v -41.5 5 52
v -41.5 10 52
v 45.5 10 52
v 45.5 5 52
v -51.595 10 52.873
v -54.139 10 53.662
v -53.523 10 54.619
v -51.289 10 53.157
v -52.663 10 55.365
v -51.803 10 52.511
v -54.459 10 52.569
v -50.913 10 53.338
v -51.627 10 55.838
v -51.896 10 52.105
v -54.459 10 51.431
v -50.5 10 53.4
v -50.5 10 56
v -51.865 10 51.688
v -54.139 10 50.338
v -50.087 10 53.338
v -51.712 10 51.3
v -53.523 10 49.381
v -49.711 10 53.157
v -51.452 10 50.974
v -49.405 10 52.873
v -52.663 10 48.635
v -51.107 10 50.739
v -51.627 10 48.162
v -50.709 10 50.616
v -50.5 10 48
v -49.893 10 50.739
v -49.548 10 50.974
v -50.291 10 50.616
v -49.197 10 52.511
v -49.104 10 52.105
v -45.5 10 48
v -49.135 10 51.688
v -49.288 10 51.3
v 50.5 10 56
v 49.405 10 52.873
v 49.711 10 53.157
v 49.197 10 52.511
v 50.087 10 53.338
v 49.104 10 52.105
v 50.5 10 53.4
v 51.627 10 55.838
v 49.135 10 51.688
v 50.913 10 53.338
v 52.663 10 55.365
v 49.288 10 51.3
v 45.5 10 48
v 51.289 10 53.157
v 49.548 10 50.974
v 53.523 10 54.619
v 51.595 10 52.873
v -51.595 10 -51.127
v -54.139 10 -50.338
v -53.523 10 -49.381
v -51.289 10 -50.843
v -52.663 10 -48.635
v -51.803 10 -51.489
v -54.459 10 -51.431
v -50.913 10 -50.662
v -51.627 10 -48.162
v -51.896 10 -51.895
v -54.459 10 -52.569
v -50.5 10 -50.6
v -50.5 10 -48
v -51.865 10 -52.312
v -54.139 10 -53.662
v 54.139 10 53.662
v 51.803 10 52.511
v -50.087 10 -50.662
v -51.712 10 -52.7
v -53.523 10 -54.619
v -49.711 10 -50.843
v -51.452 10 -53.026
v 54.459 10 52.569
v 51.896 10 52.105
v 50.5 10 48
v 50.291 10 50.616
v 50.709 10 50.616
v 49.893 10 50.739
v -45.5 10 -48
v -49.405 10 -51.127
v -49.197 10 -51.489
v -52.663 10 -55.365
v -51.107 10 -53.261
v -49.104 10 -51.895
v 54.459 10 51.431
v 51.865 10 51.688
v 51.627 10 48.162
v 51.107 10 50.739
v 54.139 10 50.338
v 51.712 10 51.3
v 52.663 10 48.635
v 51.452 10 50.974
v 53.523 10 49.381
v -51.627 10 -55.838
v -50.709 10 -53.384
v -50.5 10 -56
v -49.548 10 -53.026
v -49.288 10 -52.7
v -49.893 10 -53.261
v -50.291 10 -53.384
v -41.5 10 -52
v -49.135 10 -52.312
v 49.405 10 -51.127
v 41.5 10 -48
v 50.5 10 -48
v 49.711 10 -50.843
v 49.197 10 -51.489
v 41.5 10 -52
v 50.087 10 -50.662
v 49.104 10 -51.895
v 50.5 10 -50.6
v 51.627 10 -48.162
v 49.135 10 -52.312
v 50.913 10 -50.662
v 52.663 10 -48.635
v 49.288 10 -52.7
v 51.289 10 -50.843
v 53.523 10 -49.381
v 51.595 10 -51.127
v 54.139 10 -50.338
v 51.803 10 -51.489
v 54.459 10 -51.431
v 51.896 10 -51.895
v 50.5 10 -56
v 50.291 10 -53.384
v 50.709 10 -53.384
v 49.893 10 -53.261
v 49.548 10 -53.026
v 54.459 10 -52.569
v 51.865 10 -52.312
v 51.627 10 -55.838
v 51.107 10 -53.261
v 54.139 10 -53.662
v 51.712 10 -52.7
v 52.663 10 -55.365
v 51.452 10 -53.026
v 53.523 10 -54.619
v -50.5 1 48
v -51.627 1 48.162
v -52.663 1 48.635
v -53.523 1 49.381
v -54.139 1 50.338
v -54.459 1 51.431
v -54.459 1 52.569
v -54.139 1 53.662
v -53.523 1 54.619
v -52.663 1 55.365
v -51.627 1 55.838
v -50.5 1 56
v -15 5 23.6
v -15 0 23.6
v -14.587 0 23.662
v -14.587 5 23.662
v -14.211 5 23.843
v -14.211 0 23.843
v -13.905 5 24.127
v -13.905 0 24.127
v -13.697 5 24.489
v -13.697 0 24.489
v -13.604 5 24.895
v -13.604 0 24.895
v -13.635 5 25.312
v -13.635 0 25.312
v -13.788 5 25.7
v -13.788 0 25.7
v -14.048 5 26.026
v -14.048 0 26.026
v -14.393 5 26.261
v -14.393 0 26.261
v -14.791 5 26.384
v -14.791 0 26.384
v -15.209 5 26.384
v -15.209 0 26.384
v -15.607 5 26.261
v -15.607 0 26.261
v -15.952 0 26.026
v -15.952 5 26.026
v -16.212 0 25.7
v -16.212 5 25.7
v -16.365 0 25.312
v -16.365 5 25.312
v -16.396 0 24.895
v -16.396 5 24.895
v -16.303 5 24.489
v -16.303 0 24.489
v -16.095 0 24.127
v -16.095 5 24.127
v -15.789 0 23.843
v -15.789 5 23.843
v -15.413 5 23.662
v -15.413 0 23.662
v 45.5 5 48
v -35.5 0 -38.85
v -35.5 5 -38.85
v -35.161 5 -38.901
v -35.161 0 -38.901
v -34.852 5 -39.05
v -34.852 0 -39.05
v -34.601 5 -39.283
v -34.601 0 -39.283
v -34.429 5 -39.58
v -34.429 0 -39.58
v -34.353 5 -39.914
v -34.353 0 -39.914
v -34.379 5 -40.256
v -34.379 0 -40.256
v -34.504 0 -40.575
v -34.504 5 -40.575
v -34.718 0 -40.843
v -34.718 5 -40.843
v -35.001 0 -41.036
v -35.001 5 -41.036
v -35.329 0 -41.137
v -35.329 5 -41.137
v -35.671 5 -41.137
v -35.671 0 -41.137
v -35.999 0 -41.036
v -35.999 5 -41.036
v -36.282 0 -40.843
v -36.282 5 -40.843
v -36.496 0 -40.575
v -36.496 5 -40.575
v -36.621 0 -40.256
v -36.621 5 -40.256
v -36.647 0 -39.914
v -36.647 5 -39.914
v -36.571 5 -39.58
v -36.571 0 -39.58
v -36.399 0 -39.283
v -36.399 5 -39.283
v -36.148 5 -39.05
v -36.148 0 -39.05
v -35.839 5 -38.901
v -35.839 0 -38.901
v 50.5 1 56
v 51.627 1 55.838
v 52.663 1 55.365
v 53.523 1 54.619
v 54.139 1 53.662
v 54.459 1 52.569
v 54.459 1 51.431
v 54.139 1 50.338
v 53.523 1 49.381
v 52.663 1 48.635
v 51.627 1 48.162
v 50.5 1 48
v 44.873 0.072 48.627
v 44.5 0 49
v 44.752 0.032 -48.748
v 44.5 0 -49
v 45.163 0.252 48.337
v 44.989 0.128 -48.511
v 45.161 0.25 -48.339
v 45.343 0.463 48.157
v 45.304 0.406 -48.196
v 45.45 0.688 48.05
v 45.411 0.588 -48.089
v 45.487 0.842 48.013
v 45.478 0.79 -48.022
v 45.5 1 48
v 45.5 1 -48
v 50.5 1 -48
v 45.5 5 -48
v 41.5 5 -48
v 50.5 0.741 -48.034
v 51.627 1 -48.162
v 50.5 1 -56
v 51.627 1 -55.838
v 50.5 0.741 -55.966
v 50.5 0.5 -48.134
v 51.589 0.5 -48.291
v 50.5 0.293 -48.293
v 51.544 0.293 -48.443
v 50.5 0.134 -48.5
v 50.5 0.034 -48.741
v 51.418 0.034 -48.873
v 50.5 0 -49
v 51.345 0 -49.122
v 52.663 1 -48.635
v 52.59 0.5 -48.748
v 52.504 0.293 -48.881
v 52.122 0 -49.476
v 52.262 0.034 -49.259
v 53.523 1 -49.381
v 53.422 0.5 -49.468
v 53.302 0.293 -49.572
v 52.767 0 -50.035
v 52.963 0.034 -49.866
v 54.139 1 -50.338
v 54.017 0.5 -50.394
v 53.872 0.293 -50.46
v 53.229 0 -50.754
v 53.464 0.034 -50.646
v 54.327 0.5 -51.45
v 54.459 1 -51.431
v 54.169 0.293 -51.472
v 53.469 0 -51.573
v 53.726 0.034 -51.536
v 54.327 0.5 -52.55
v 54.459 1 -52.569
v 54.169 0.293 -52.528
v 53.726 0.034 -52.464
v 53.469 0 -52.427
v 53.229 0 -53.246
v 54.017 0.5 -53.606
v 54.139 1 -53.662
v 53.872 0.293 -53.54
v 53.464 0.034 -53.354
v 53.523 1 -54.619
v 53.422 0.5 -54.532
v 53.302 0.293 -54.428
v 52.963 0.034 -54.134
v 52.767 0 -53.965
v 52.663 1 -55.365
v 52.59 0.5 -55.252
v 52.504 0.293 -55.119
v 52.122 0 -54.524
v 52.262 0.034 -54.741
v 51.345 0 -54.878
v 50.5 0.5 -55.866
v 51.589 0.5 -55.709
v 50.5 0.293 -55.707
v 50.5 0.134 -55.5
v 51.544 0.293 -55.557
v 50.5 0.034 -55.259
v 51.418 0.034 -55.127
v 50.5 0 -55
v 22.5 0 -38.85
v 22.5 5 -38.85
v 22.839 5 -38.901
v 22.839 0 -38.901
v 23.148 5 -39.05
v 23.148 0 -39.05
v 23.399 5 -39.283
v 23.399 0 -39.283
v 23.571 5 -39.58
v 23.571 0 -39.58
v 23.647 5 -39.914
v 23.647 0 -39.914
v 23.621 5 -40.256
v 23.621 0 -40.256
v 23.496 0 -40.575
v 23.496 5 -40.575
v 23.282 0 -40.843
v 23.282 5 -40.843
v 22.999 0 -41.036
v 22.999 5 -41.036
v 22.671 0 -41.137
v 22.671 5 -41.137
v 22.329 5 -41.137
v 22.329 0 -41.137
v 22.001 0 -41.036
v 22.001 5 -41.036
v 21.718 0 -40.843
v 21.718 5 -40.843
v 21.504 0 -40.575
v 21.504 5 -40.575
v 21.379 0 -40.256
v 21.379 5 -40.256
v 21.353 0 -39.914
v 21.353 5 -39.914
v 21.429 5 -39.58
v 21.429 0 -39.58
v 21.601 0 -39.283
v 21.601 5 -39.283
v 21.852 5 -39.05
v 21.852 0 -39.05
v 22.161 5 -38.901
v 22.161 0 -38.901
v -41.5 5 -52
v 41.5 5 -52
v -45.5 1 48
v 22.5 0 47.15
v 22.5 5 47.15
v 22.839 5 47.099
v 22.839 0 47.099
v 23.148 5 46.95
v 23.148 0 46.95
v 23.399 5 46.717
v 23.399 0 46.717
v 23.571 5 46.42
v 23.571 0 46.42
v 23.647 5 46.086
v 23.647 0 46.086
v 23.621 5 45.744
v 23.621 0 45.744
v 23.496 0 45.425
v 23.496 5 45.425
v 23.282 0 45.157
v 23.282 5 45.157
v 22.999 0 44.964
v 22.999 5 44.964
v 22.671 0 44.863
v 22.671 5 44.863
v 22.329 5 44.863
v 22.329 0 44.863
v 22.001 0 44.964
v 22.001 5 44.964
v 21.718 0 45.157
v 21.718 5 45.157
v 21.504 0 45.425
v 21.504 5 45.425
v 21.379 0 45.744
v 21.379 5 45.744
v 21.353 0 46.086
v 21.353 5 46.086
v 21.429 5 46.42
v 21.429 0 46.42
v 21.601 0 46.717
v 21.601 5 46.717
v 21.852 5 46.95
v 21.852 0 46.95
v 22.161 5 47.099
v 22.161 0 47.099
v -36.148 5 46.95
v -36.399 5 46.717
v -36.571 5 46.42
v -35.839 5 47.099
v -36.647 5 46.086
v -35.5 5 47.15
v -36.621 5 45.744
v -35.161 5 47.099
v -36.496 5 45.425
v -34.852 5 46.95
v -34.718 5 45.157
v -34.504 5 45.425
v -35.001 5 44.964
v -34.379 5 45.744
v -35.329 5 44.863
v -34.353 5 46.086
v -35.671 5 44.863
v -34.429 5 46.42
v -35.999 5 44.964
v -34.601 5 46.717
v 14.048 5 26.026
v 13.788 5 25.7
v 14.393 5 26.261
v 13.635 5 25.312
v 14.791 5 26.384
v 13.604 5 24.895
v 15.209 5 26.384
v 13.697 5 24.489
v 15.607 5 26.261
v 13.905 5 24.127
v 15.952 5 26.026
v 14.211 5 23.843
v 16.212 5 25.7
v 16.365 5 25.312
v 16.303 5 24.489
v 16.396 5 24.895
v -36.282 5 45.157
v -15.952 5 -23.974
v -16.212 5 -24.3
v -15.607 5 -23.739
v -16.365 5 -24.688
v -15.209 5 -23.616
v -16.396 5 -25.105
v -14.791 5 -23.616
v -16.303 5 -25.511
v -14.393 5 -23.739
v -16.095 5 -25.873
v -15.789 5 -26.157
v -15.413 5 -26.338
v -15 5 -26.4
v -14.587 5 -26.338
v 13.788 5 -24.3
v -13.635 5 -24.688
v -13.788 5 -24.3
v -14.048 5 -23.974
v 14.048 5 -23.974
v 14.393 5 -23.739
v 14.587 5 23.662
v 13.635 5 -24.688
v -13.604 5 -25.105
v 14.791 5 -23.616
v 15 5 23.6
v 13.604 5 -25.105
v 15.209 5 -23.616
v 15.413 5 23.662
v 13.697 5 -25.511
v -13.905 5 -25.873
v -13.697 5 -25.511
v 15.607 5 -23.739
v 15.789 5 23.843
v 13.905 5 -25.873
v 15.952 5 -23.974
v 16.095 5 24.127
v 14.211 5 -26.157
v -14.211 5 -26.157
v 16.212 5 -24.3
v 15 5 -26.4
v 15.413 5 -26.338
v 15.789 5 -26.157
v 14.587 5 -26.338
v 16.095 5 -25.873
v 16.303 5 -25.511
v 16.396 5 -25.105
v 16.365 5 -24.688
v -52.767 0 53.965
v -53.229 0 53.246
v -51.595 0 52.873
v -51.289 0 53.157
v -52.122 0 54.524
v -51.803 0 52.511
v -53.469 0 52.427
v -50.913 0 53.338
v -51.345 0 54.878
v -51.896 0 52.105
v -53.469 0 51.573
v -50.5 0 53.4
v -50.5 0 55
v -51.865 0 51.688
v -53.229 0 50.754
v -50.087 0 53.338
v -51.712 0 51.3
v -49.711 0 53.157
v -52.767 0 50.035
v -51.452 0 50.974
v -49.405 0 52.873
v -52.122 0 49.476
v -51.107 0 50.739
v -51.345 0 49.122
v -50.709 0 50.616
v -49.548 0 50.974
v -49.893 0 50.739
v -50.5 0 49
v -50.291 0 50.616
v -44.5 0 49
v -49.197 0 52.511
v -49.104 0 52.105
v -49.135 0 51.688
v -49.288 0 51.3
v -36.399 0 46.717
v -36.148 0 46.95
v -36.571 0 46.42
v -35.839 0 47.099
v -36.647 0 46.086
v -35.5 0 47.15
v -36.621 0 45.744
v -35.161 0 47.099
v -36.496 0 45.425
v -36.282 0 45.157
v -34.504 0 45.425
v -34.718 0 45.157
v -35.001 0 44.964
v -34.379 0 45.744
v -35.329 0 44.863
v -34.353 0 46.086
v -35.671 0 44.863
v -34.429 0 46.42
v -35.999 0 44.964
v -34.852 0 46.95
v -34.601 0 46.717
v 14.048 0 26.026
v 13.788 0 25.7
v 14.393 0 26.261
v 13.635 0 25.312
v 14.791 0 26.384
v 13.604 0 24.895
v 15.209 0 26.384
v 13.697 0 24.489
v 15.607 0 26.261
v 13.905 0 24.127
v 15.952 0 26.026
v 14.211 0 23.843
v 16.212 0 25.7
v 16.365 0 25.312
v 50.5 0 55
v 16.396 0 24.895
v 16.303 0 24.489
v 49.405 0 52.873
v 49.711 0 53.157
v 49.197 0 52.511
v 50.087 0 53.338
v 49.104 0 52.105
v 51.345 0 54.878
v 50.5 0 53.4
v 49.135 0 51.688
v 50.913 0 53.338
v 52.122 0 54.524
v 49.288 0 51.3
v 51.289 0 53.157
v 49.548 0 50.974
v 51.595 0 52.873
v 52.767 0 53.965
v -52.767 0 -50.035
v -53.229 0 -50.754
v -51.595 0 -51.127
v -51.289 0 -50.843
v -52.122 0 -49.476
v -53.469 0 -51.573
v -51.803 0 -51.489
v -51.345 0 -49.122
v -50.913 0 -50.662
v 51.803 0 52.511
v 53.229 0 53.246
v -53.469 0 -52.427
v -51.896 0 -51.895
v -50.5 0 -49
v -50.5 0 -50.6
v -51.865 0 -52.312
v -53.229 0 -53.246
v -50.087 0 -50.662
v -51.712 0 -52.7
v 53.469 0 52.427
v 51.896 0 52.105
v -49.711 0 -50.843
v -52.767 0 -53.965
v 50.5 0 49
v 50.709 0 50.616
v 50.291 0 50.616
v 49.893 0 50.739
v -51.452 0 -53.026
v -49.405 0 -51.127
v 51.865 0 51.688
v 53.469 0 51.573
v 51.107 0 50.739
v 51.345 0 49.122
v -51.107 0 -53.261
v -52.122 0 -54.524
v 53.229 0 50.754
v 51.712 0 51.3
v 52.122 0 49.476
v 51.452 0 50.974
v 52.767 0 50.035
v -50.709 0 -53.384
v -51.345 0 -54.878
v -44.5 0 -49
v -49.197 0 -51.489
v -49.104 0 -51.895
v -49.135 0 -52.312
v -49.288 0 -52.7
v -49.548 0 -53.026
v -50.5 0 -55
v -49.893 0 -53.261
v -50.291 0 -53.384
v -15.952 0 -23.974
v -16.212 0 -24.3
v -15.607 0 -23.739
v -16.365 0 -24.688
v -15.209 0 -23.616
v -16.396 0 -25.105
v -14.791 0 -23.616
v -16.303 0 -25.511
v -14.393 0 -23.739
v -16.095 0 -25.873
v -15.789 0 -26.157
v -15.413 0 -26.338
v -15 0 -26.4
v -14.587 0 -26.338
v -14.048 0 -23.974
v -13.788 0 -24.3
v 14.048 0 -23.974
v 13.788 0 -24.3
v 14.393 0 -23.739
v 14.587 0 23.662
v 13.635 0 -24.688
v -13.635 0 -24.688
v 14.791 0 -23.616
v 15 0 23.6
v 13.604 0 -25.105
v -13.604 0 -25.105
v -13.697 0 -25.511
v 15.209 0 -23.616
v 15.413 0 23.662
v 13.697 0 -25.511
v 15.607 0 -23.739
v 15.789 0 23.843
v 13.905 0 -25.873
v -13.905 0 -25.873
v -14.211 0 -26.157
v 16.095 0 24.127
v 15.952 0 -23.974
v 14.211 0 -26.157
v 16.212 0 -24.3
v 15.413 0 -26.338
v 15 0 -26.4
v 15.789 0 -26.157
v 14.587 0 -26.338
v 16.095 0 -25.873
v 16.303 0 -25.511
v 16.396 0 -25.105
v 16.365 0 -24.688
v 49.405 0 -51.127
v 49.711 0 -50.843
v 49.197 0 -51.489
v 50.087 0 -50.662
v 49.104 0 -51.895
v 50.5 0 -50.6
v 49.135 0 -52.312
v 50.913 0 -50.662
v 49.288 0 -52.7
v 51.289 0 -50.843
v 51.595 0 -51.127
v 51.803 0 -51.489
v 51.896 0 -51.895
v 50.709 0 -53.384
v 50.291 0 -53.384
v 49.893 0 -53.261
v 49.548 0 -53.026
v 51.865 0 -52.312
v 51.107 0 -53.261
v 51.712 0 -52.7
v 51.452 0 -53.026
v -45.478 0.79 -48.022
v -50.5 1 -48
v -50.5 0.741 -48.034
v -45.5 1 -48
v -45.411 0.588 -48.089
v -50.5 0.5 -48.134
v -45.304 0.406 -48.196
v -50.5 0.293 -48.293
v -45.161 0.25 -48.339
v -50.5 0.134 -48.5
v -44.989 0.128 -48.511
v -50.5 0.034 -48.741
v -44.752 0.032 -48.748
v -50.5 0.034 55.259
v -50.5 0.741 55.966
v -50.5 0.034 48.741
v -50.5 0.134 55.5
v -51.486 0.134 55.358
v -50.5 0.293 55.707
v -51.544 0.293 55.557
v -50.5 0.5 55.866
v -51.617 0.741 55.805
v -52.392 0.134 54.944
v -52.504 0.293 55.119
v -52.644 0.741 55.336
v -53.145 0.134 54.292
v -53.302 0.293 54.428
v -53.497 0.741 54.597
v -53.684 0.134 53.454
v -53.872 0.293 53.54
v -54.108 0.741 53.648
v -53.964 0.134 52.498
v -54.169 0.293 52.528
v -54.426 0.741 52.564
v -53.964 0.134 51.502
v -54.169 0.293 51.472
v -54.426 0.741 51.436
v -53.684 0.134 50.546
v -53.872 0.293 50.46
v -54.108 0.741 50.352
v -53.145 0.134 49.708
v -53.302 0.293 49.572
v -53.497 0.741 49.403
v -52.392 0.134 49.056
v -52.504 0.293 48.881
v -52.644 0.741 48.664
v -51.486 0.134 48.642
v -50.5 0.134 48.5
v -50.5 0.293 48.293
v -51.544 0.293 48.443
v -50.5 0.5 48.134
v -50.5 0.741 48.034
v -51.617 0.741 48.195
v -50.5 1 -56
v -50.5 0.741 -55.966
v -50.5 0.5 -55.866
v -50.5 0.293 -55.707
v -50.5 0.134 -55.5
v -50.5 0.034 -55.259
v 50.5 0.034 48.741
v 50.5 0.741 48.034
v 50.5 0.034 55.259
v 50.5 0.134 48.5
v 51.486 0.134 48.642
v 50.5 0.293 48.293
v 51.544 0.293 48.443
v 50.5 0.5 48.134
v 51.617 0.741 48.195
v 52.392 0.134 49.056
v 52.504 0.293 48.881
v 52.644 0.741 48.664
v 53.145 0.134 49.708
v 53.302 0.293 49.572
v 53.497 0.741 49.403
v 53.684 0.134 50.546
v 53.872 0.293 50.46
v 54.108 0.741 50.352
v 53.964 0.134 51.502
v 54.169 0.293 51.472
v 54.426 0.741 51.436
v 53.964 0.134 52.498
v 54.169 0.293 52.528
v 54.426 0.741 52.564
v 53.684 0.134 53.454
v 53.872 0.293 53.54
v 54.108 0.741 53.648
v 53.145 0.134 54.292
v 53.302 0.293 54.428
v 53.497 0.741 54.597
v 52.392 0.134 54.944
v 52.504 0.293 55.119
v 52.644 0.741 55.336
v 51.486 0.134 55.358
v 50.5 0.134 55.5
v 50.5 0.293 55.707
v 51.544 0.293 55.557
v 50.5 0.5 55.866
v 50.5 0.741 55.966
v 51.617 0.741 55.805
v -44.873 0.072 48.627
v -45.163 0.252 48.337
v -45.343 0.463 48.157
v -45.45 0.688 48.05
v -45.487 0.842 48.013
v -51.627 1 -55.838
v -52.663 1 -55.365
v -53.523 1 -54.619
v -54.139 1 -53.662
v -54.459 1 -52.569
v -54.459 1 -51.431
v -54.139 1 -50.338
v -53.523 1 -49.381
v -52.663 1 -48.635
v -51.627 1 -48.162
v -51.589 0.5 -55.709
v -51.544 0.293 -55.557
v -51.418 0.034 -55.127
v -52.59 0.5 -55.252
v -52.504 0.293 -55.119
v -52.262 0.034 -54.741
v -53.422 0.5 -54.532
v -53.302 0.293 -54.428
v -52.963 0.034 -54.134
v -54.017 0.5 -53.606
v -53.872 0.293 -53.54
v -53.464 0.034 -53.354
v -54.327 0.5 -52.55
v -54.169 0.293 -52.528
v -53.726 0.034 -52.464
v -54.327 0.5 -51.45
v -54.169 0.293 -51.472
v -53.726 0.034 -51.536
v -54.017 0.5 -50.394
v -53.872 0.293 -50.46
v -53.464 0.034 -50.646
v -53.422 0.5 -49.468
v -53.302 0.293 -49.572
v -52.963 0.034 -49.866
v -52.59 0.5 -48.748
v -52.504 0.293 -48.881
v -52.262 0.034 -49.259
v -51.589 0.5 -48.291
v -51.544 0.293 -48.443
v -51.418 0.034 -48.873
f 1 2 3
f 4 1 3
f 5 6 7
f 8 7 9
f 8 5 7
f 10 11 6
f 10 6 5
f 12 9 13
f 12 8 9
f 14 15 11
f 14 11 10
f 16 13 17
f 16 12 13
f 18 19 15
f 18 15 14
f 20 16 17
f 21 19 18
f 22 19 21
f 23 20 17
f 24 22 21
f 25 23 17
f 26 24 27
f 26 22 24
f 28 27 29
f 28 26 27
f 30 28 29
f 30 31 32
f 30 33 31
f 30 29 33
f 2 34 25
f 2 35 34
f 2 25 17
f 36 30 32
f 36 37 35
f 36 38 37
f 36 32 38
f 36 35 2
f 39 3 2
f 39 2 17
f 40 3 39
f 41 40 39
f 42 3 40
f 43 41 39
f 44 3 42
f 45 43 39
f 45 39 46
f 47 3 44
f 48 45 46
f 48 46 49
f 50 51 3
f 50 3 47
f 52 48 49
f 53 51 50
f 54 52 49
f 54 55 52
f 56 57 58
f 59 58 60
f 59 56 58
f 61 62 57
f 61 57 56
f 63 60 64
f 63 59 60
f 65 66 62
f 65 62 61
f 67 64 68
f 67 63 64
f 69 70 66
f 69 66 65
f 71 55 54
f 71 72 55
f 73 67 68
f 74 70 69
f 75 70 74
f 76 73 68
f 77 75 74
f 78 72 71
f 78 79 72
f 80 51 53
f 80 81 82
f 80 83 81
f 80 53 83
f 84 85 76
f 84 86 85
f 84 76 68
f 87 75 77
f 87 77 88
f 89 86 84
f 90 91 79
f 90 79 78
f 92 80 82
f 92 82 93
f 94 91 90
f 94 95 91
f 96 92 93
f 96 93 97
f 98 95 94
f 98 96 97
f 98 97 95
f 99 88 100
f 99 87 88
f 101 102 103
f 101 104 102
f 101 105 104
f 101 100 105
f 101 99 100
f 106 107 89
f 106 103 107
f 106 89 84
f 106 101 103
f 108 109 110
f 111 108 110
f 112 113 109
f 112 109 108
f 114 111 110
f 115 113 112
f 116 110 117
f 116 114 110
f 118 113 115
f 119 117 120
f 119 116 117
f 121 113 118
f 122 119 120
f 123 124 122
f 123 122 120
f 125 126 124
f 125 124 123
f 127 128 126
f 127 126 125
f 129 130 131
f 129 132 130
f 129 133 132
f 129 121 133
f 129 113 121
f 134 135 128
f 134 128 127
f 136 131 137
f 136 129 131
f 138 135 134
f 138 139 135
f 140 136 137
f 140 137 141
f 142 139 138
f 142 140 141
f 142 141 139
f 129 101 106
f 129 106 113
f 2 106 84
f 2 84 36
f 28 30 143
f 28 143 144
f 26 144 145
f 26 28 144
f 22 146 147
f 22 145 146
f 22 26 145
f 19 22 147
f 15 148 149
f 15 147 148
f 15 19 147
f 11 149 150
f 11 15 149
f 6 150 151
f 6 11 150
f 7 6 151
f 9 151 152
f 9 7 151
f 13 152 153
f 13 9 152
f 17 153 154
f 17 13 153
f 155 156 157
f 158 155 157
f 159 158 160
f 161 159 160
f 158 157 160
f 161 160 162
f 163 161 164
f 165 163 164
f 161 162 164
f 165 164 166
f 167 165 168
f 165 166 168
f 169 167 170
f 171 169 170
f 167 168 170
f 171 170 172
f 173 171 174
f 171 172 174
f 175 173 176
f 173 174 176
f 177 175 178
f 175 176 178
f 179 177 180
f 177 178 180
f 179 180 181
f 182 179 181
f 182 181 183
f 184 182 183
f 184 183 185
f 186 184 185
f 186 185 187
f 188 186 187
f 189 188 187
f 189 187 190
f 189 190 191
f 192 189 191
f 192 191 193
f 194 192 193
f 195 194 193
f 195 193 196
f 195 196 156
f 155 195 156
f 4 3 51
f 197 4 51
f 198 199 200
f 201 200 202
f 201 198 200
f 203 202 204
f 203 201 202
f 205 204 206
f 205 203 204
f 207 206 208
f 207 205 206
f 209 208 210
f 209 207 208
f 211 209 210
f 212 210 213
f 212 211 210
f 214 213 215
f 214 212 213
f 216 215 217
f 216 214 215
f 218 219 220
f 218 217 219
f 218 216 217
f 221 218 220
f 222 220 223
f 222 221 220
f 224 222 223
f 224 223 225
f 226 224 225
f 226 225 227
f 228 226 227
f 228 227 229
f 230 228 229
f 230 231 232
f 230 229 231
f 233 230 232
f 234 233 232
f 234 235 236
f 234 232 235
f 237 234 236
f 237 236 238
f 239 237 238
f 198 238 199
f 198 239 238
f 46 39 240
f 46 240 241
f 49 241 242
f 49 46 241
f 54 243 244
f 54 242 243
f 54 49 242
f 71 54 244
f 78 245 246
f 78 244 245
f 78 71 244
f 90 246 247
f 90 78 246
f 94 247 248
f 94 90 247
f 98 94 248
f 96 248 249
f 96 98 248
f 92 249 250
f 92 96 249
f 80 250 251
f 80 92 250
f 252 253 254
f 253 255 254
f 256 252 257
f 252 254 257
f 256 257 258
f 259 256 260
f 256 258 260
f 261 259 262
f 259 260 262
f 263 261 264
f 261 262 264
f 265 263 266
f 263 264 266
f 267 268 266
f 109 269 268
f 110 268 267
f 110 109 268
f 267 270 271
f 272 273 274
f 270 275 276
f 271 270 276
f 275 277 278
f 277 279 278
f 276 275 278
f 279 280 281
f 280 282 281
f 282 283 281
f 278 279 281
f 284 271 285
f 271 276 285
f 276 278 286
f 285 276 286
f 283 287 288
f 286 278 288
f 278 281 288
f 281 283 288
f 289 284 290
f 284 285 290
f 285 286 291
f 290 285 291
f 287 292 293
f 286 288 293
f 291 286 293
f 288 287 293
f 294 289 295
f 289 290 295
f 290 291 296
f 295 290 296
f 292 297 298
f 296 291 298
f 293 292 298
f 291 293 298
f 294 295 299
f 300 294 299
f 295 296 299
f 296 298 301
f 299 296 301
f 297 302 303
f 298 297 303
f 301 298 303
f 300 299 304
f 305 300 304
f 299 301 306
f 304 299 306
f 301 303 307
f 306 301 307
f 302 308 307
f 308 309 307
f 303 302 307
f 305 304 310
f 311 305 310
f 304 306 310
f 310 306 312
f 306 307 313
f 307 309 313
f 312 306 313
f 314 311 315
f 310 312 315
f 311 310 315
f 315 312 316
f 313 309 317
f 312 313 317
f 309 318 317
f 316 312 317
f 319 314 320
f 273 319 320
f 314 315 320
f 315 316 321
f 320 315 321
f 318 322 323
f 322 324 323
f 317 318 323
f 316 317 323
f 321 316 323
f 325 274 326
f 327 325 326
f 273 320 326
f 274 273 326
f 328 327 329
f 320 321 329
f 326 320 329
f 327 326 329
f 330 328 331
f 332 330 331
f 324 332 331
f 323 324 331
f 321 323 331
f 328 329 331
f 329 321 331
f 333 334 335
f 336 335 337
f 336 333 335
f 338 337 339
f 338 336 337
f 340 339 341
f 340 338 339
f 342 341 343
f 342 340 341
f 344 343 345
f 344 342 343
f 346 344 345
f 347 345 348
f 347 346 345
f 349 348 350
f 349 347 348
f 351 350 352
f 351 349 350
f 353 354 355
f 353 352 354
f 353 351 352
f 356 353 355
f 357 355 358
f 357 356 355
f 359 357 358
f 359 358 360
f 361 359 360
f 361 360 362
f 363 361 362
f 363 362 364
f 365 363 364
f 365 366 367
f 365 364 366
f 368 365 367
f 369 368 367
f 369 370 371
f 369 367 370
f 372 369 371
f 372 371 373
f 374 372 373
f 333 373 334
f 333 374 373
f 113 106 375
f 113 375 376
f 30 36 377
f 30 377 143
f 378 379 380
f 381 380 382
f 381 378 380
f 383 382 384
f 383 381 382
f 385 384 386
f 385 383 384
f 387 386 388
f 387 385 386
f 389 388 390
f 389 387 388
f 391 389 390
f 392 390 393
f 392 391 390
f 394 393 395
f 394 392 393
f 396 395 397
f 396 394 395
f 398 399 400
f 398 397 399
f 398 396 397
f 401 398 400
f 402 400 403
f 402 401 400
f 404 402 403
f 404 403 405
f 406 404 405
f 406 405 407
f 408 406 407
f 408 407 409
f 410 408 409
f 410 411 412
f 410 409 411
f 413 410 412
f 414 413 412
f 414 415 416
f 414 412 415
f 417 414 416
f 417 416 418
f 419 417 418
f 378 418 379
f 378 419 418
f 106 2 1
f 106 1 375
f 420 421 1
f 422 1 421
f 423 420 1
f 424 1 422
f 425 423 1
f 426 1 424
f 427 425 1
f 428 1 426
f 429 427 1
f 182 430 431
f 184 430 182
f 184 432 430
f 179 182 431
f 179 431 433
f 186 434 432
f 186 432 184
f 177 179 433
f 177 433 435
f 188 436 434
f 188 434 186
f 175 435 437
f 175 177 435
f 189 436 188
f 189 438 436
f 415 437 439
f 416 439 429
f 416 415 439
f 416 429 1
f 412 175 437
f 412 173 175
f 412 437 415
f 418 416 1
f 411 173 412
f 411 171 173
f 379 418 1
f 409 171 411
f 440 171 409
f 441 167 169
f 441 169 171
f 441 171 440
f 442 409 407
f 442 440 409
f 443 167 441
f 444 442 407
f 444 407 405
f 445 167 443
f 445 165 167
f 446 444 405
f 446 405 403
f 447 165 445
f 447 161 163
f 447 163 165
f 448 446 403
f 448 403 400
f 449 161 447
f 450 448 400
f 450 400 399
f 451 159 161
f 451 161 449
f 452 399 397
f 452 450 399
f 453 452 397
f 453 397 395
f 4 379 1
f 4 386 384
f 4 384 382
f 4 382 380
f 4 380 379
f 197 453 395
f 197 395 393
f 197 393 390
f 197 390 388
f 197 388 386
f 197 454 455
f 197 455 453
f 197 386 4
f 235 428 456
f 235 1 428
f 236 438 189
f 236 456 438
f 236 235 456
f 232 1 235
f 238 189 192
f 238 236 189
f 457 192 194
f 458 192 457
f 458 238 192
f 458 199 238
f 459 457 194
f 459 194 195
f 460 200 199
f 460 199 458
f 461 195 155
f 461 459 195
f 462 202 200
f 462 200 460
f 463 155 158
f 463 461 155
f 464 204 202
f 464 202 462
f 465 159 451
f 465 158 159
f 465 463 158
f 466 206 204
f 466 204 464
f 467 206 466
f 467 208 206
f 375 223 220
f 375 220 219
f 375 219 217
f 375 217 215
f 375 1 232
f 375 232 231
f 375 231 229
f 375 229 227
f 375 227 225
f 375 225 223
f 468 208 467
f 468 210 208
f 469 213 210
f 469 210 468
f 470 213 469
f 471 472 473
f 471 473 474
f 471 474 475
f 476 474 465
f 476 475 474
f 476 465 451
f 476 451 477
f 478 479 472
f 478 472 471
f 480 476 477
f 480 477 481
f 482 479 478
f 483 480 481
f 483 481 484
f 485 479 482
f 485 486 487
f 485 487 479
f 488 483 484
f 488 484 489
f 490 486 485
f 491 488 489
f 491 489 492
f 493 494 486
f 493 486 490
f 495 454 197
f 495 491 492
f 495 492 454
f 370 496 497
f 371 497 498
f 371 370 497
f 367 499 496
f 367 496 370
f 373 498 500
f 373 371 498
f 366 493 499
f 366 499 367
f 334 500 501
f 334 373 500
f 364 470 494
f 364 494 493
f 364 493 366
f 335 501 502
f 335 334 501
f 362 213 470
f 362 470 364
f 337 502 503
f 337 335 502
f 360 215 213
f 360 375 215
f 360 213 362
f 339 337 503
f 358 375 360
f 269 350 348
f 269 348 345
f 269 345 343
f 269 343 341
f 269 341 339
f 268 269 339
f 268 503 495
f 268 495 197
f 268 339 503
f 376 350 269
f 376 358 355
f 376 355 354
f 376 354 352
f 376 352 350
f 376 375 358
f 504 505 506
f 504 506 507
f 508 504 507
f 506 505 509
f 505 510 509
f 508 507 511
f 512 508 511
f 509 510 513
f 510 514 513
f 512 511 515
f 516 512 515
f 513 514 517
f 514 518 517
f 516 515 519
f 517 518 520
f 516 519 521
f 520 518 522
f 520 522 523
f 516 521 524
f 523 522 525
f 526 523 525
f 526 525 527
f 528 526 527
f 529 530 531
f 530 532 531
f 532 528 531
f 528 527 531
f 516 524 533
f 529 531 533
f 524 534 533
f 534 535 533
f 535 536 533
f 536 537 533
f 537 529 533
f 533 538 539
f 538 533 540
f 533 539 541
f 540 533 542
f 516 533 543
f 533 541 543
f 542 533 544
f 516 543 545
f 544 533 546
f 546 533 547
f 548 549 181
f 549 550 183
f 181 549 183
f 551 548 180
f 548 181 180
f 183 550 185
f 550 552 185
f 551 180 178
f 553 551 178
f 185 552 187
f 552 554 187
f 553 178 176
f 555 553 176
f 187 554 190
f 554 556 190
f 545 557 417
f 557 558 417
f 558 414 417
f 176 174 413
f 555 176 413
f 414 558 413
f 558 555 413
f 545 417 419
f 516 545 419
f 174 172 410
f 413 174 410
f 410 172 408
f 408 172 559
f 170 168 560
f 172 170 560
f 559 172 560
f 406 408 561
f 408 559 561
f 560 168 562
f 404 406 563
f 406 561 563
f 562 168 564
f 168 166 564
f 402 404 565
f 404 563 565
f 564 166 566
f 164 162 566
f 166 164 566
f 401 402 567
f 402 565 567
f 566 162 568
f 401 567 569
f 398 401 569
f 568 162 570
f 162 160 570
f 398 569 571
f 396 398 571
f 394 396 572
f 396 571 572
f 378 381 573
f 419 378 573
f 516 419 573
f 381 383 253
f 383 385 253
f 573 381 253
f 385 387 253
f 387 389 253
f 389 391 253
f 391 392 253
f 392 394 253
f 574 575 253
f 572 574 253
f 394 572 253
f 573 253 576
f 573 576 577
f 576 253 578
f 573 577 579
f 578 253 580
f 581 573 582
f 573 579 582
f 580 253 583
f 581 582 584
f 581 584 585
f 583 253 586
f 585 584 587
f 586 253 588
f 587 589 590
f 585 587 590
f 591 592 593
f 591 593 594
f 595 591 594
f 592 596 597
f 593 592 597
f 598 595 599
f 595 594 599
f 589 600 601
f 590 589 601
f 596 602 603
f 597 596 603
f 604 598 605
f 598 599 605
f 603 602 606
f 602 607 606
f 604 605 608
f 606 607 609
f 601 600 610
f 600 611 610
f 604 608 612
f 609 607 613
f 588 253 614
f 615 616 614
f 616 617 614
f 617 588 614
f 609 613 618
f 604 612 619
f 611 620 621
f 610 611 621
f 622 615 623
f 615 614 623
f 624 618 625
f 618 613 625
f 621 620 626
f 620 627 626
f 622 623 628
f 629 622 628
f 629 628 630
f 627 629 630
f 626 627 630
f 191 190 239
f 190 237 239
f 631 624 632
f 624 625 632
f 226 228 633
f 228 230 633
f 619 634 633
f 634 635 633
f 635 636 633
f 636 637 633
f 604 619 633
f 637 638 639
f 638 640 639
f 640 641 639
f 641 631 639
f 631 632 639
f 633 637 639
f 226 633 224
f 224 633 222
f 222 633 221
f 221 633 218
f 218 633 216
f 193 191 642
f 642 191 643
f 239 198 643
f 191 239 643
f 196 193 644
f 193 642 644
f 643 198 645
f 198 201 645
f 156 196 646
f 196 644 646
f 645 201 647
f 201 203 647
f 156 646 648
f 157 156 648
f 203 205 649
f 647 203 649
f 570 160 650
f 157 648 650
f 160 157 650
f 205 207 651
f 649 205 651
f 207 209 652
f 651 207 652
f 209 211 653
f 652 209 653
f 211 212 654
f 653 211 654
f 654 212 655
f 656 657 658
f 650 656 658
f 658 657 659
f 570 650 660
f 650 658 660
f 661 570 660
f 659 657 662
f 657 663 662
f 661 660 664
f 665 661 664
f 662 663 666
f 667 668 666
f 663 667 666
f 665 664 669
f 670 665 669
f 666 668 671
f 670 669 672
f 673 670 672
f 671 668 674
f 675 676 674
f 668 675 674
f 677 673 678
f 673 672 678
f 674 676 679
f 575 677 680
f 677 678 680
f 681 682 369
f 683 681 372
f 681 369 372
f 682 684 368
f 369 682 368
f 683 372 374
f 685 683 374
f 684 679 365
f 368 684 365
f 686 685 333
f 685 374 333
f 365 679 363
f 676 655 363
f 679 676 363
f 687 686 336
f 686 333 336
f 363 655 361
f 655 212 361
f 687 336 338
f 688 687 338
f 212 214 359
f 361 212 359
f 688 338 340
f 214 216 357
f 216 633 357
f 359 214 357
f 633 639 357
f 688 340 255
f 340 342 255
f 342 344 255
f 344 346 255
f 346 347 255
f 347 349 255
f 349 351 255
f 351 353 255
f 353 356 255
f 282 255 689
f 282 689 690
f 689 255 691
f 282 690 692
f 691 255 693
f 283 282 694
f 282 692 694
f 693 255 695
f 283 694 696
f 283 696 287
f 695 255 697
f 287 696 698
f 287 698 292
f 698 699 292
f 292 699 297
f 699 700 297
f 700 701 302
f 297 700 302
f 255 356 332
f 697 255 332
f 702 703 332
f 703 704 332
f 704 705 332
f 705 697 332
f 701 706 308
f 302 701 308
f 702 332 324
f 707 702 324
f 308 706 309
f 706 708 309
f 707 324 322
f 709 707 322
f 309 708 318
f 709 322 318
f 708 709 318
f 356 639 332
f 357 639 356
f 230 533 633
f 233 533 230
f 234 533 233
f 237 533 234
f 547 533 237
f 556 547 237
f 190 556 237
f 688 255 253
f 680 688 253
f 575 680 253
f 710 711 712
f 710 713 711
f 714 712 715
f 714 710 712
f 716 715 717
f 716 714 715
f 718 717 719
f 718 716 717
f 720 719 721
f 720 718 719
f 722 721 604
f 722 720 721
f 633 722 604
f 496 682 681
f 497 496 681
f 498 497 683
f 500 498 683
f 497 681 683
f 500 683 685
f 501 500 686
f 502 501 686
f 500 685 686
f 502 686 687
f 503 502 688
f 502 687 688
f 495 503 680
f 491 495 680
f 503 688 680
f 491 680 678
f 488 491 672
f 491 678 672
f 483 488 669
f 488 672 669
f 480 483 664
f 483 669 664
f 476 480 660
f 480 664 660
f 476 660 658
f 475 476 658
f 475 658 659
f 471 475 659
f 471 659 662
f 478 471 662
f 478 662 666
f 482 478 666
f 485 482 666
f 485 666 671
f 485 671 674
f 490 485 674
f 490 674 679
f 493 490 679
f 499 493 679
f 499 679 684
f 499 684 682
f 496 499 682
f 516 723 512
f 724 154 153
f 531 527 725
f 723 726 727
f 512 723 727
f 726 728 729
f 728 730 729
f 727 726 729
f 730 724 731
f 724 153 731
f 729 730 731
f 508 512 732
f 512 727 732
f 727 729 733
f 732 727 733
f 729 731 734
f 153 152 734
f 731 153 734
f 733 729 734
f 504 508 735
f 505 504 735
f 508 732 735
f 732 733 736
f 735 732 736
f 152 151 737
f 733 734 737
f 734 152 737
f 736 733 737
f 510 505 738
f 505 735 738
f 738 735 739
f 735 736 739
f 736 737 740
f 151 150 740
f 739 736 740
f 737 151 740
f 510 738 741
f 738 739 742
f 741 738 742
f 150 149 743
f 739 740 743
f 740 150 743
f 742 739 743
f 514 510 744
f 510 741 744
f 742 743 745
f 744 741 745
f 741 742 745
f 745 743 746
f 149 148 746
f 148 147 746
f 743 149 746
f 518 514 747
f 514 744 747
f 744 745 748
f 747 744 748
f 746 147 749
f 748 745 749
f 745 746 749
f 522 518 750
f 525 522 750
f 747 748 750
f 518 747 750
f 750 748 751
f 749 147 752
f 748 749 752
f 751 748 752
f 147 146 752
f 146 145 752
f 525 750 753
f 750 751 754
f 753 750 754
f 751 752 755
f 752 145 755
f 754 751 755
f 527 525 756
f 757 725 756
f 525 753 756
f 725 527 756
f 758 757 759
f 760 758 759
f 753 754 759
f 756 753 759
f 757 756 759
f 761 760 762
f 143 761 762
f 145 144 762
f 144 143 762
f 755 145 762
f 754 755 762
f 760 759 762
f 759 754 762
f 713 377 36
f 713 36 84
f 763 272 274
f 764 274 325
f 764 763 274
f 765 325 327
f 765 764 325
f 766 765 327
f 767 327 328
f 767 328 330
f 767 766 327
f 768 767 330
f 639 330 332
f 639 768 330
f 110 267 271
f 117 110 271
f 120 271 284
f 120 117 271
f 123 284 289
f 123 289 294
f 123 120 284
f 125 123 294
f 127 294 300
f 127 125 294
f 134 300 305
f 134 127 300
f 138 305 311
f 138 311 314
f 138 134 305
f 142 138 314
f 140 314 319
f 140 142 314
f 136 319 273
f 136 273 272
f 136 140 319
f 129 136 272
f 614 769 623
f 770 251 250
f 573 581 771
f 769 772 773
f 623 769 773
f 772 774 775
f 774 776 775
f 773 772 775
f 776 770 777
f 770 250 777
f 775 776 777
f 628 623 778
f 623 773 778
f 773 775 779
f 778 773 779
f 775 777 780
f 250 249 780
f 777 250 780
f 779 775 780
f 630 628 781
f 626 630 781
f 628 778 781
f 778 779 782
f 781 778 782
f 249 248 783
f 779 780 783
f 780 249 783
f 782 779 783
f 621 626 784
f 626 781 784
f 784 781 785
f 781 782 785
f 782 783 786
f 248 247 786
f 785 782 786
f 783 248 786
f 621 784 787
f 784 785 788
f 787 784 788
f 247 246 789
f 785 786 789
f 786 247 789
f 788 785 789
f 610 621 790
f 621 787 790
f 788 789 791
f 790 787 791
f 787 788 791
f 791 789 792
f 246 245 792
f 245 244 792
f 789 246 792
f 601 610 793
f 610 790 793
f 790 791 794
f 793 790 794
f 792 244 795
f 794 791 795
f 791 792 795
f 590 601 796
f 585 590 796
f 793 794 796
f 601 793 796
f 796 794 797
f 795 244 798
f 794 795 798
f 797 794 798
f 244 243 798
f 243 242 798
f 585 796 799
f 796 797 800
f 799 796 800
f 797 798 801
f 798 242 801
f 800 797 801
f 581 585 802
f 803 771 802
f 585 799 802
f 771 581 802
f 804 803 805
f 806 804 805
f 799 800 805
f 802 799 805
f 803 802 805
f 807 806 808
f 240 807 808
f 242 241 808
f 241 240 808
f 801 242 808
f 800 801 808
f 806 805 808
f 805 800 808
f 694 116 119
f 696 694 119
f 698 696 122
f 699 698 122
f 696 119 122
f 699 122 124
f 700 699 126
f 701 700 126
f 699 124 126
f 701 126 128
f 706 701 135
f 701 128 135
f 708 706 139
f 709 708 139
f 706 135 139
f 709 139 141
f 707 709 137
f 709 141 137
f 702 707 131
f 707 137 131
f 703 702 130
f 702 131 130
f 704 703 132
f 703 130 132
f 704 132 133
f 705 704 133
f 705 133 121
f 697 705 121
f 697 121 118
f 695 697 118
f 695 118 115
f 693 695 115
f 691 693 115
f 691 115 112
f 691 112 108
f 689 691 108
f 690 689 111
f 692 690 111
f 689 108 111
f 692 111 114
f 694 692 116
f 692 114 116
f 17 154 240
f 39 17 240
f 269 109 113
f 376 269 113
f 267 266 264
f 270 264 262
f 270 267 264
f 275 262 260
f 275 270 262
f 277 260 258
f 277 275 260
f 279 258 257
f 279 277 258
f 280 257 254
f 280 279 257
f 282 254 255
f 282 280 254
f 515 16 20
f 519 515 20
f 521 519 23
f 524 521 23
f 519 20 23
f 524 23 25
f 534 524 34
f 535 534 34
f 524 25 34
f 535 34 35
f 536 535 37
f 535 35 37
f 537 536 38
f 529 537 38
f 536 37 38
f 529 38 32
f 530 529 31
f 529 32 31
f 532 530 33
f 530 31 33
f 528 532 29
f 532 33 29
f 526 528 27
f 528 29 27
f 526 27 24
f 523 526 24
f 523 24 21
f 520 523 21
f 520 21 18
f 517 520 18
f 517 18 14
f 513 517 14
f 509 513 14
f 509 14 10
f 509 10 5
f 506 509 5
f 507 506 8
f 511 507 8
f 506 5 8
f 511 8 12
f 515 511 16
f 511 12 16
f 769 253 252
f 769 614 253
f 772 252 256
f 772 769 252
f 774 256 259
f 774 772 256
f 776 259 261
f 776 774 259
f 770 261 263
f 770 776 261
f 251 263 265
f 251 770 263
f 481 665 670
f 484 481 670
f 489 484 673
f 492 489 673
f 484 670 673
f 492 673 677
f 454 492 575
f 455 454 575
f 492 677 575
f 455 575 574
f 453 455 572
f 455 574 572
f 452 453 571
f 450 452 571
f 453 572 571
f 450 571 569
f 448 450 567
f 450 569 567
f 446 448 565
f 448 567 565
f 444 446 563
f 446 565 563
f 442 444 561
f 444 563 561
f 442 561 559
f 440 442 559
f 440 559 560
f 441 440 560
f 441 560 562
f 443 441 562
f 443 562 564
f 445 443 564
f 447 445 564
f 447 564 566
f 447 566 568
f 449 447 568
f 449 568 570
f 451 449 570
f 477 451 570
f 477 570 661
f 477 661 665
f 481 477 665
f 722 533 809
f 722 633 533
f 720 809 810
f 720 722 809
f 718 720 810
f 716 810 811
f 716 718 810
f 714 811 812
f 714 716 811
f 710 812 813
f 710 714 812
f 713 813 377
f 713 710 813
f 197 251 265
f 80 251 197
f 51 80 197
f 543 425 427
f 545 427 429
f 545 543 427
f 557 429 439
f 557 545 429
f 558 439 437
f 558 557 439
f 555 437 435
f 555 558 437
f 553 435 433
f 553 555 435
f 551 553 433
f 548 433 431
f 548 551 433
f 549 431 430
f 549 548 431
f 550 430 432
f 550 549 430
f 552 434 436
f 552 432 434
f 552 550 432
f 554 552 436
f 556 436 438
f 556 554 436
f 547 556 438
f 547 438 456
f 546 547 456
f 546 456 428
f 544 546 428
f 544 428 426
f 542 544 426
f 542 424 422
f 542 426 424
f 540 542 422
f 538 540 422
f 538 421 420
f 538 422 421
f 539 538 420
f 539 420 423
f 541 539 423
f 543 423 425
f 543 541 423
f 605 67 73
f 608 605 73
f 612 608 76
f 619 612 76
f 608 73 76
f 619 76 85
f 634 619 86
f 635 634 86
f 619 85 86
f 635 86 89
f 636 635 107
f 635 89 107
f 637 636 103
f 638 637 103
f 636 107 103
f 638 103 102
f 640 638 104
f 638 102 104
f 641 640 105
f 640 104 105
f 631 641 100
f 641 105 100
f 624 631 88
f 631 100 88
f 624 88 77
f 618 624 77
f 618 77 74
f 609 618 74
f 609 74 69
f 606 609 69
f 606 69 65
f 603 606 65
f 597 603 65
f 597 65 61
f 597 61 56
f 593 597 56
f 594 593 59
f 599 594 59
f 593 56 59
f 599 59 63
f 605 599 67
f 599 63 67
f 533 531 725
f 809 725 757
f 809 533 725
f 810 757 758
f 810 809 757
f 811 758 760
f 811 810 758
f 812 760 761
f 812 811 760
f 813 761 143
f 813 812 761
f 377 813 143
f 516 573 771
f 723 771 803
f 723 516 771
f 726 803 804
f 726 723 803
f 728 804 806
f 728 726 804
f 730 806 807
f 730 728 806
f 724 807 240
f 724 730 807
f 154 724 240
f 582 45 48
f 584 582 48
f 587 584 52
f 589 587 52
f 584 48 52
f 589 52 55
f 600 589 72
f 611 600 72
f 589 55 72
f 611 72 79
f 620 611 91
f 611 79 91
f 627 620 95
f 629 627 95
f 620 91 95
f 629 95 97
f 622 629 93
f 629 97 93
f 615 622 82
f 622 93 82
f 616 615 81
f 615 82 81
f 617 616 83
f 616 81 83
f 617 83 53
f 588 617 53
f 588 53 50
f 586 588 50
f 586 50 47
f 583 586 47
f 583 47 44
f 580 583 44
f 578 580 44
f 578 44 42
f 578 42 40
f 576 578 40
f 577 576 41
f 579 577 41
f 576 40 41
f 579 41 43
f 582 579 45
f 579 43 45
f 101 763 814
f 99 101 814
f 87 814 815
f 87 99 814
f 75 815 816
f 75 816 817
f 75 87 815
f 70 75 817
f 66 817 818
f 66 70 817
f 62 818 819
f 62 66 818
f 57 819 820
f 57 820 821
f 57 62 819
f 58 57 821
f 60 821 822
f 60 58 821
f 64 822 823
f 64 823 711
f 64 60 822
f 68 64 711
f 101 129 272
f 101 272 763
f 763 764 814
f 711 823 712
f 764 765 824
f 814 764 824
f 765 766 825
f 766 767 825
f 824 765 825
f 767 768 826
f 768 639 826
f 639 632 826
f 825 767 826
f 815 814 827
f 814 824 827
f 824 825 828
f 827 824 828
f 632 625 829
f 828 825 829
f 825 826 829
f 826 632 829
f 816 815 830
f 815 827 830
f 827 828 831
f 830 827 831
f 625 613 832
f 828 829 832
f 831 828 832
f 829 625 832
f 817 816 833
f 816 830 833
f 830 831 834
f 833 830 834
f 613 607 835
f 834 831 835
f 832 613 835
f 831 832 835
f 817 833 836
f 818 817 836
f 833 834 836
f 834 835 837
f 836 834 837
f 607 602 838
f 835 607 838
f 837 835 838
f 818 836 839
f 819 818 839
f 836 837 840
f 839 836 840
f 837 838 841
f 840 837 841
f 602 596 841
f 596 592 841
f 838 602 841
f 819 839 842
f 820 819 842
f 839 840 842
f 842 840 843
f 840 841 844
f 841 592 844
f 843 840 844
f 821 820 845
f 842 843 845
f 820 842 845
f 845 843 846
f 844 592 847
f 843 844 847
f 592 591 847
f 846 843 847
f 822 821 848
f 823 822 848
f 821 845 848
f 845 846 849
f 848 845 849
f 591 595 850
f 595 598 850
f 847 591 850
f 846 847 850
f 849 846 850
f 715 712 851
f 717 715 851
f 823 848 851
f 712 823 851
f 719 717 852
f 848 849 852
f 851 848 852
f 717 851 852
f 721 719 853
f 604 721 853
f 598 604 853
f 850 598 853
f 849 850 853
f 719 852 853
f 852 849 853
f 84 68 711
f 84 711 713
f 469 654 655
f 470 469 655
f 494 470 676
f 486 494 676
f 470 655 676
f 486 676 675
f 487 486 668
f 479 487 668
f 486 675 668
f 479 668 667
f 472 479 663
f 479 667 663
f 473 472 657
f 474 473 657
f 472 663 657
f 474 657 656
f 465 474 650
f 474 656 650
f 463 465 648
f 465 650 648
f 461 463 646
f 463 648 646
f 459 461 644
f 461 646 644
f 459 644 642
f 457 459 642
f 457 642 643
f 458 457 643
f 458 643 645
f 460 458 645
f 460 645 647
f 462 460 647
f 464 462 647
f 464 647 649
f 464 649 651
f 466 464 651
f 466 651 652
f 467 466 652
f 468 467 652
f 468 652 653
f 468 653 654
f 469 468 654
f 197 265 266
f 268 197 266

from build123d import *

# Parameters (mm, degrees)
SKETCH1_W                         = 91
SKETCH1_H                         = 112
SKETCH1_R                         = 1.15
BASE_DEPTH                        = 10
SKETCH2_W                         = 83
SKETCH2_H                         = 104
MODULE_CUTOUT_DEPTH               = 5
SKETCH3_R                         = 1.4
CASE_ASSEMBLY_HOLES_DEPTH         = 10
SKETCH5_W                         = 4
SKETCH5_H                         = 100
PORTS_SIDE_RECESS_DEPTH           = 5
BASKET_CLAMP_MOUNTING_HOLES_REACH = 80.78
SKETCH4_R                         = 1.4
F_1MM_EDGE_FILLETS_R              = 1


with BuildPart() as part:
    # Sketch1 → Base (new body)
    with BuildSketch(Plane(origin=(0, 0, 0), x_dir=(1, 0, 0), z_dir=(0, 1, 0))):
        Rectangle(SKETCH1_W, SKETCH1_H)
        with Locations(Location((-35.5, -46, 0), (0, 0, 270))):
            Circle(SKETCH1_R, mode=Mode.SUBTRACT)
        with Locations(Location((22.5, -46, 0), (0, 0, 270))):
            Circle(SKETCH1_R, mode=Mode.SUBTRACT)
        with Locations(Location((22.5, 40, 0), (0, 0, 270))):
            Circle(SKETCH1_R, mode=Mode.SUBTRACT)
        with Locations(Location((-35.5, 40, 0), (0, 0, 270))):
            Circle(SKETCH1_R, mode=Mode.SUBTRACT)
    extrude(amount=BASE_DEPTH)

    # Sketch2 → Module Cutout (cut)
    with BuildSketch(Plane(origin=(0, 10, 0), x_dir=(1, 0, 0), z_dir=(0, 1, 0))):
        Rectangle(SKETCH2_W, SKETCH2_H)
    extrude(amount=-MODULE_CUTOUT_DEPTH, mode=Mode.SUBTRACT)

    # Sketch3 → Case Assembly Holes (add)
    # profile 1 of 4: a face of its own
    with BuildSketch(Plane(origin=(0, 10, 0), x_dir=(1, 0, 0), z_dir=(0, 1, 0))):
        with BuildLine():
            Line((-45.5, 56), (-50.5, 56))
            ThreePointArc((-50.5, 56), (-54.5, 52), (-50.5, 48))
            Line((-50.5, 48), (-45.5, 48))
            Line((-45.5, 48), (-45.5, 56))
        make_face()
        with Locations(Location((-50.5, 52, 0), (0, 0, 270))):
            Circle(SKETCH3_R, mode=Mode.SUBTRACT)
    # profile 2 of 4: a face of its own
    with BuildSketch(Plane(origin=(0, 10, 0), x_dir=(1, 0, 0), z_dir=(0, 1, 0))):
        with BuildLine():
            Line((45.5, 48), (50.5, 48))
            ThreePointArc((50.5, 48), (54.5, 52), (50.5, 56))
            Line((50.5, 56), (45.5, 56))
            Line((45.5, 56), (45.5, 48))
        make_face()
        with Locations(Location((50.5, 52, 0), (0, 0, 270))):
            Circle(SKETCH3_R, mode=Mode.SUBTRACT)
    # profile 3 of 4: a face of its own
    with BuildSketch(Plane(origin=(0, 10, 0), x_dir=(1, 0, 0), z_dir=(0, 1, 0))):
        with BuildLine():
            Line((45.5, -56), (50.5, -56))
            ThreePointArc((50.5, -56), (54.5, -52), (50.5, -48))
            Line((50.5, -48), (45.5, -48))
            Line((45.5, -48), (45.5, -56))
        make_face()
        with Locations(Location((50.5, -52, 0), (0, 0, 270))):
            Circle(SKETCH3_R, mode=Mode.SUBTRACT)
    # profile 4 of 4: a face of its own
    with BuildSketch(Plane(origin=(0, 10, 0), x_dir=(1, 0, 0), z_dir=(0, 1, 0))):
        with BuildLine():
            Line((-45.5, -48), (-50.5, -48))
            ThreePointArc((-50.5, -48), (-54.5, -52), (-50.5, -56))
            Line((-50.5, -56), (-45.5, -56))
            Line((-45.5, -56), (-45.5, -48))
        make_face()
        with Locations(Location((-50.5, -52, 0), (0, 0, 270))):
            Circle(SKETCH3_R, mode=Mode.SUBTRACT)
    extrude(amount=-CASE_ASSEMBLY_HOLES_DEPTH)

    # Sketch5 → Ports Side Recess (cut)
    with BuildSketch(Plane(origin=(0, 10, 0), x_dir=(1, 0, 0), z_dir=(0, 1, 0))):
        with Locations((43.5, -2)):
            Rectangle(SKETCH5_W, SKETCH5_H)
    extrude(amount=-PORTS_SIDE_RECESS_DEPTH, mode=Mode.SUBTRACT)

    # Sketch4 → Basket Clamp Mounting Holes (cut, up to next)
    with BuildSketch(Plane.XZ, mode=Mode.PRIVATE) as basket_clamp_mounting_holes_sk1:
        with Locations(Location((-15, 25, 0), (0, 0, 270))):
            Circle(SKETCH4_R)
    basket_clamp_mounting_holes_tool1 = extrude(basket_clamp_mounting_holes_sk1.sketch, amount=-BASKET_CLAMP_MOUNTING_HOLES_REACH, mode=Mode.PRIVATE) & part.part
    # Sketch4 → Basket Clamp Mounting Holes (cut, up to next)
    with BuildSketch(Plane.XZ, mode=Mode.PRIVATE) as basket_clamp_mounting_holes_sk2:
        with Locations(Location((-15, -25, 0), (0, 0, 270))):
            Circle(SKETCH4_R)
    basket_clamp_mounting_holes_tool2 = extrude(basket_clamp_mounting_holes_sk2.sketch, amount=-BASKET_CLAMP_MOUNTING_HOLES_REACH, mode=Mode.PRIVATE) & part.part
    # Sketch4 → Basket Clamp Mounting Holes (cut, up to next)
    with BuildSketch(Plane.XZ, mode=Mode.PRIVATE) as basket_clamp_mounting_holes_sk3:
        with Locations(Location((15, -25, 0), (0, 0, 270))):
            Circle(SKETCH4_R)
    basket_clamp_mounting_holes_tool3 = extrude(basket_clamp_mounting_holes_sk3.sketch, amount=-BASKET_CLAMP_MOUNTING_HOLES_REACH, mode=Mode.PRIVATE) & part.part
    # Sketch4 → Basket Clamp Mounting Holes (cut, up to next)
    with BuildSketch(Plane.XZ, mode=Mode.PRIVATE) as basket_clamp_mounting_holes_sk4:
        with Locations(Location((15, 25, 0), (0, 0, 270))):
            Circle(SKETCH4_R)
    basket_clamp_mounting_holes_tool4 = extrude(basket_clamp_mounting_holes_sk4.sketch, amount=-BASKET_CLAMP_MOUNTING_HOLES_REACH, mode=Mode.PRIVATE) & part.part
    add(basket_clamp_mounting_holes_tool1.solids().sort_by_distance((-15, 0, 25))[0], mode=Mode.SUBTRACT)
    add(basket_clamp_mounting_holes_tool2.solids().sort_by_distance((-15, 0, -25))[0], mode=Mode.SUBTRACT)
    add(basket_clamp_mounting_holes_tool3.solids().sort_by_distance((15, 0, -25))[0], mode=Mode.SUBTRACT)
    add(basket_clamp_mounting_holes_tool4.solids().sort_by_distance((15, 0, 25))[0], mode=Mode.SUBTRACT)

    # 1mm Edge Fillets
    f_1mm_edge_fillets_edges = [part.edges().sort_by_distance(p)[0] for p in [
        (0, 0, -56),
        (-45.5, 0, 0),
        (-48, 0, -48),
        (-54.5, 0, -52),
        (0, 0, 56),
        (54.5, 0, -52),
        (48, 0, -48),
        (45.5, 0, 0),
        (54.5, 0, 52),
        (48, 0, 48),
        (-54.5, 0, 52),
        (-48, 0, 48),
    ]]
    fillet(f_1mm_edge_fillets_edges, radius=F_1MM_EDGE_FILLETS_R)


solid = part.part
